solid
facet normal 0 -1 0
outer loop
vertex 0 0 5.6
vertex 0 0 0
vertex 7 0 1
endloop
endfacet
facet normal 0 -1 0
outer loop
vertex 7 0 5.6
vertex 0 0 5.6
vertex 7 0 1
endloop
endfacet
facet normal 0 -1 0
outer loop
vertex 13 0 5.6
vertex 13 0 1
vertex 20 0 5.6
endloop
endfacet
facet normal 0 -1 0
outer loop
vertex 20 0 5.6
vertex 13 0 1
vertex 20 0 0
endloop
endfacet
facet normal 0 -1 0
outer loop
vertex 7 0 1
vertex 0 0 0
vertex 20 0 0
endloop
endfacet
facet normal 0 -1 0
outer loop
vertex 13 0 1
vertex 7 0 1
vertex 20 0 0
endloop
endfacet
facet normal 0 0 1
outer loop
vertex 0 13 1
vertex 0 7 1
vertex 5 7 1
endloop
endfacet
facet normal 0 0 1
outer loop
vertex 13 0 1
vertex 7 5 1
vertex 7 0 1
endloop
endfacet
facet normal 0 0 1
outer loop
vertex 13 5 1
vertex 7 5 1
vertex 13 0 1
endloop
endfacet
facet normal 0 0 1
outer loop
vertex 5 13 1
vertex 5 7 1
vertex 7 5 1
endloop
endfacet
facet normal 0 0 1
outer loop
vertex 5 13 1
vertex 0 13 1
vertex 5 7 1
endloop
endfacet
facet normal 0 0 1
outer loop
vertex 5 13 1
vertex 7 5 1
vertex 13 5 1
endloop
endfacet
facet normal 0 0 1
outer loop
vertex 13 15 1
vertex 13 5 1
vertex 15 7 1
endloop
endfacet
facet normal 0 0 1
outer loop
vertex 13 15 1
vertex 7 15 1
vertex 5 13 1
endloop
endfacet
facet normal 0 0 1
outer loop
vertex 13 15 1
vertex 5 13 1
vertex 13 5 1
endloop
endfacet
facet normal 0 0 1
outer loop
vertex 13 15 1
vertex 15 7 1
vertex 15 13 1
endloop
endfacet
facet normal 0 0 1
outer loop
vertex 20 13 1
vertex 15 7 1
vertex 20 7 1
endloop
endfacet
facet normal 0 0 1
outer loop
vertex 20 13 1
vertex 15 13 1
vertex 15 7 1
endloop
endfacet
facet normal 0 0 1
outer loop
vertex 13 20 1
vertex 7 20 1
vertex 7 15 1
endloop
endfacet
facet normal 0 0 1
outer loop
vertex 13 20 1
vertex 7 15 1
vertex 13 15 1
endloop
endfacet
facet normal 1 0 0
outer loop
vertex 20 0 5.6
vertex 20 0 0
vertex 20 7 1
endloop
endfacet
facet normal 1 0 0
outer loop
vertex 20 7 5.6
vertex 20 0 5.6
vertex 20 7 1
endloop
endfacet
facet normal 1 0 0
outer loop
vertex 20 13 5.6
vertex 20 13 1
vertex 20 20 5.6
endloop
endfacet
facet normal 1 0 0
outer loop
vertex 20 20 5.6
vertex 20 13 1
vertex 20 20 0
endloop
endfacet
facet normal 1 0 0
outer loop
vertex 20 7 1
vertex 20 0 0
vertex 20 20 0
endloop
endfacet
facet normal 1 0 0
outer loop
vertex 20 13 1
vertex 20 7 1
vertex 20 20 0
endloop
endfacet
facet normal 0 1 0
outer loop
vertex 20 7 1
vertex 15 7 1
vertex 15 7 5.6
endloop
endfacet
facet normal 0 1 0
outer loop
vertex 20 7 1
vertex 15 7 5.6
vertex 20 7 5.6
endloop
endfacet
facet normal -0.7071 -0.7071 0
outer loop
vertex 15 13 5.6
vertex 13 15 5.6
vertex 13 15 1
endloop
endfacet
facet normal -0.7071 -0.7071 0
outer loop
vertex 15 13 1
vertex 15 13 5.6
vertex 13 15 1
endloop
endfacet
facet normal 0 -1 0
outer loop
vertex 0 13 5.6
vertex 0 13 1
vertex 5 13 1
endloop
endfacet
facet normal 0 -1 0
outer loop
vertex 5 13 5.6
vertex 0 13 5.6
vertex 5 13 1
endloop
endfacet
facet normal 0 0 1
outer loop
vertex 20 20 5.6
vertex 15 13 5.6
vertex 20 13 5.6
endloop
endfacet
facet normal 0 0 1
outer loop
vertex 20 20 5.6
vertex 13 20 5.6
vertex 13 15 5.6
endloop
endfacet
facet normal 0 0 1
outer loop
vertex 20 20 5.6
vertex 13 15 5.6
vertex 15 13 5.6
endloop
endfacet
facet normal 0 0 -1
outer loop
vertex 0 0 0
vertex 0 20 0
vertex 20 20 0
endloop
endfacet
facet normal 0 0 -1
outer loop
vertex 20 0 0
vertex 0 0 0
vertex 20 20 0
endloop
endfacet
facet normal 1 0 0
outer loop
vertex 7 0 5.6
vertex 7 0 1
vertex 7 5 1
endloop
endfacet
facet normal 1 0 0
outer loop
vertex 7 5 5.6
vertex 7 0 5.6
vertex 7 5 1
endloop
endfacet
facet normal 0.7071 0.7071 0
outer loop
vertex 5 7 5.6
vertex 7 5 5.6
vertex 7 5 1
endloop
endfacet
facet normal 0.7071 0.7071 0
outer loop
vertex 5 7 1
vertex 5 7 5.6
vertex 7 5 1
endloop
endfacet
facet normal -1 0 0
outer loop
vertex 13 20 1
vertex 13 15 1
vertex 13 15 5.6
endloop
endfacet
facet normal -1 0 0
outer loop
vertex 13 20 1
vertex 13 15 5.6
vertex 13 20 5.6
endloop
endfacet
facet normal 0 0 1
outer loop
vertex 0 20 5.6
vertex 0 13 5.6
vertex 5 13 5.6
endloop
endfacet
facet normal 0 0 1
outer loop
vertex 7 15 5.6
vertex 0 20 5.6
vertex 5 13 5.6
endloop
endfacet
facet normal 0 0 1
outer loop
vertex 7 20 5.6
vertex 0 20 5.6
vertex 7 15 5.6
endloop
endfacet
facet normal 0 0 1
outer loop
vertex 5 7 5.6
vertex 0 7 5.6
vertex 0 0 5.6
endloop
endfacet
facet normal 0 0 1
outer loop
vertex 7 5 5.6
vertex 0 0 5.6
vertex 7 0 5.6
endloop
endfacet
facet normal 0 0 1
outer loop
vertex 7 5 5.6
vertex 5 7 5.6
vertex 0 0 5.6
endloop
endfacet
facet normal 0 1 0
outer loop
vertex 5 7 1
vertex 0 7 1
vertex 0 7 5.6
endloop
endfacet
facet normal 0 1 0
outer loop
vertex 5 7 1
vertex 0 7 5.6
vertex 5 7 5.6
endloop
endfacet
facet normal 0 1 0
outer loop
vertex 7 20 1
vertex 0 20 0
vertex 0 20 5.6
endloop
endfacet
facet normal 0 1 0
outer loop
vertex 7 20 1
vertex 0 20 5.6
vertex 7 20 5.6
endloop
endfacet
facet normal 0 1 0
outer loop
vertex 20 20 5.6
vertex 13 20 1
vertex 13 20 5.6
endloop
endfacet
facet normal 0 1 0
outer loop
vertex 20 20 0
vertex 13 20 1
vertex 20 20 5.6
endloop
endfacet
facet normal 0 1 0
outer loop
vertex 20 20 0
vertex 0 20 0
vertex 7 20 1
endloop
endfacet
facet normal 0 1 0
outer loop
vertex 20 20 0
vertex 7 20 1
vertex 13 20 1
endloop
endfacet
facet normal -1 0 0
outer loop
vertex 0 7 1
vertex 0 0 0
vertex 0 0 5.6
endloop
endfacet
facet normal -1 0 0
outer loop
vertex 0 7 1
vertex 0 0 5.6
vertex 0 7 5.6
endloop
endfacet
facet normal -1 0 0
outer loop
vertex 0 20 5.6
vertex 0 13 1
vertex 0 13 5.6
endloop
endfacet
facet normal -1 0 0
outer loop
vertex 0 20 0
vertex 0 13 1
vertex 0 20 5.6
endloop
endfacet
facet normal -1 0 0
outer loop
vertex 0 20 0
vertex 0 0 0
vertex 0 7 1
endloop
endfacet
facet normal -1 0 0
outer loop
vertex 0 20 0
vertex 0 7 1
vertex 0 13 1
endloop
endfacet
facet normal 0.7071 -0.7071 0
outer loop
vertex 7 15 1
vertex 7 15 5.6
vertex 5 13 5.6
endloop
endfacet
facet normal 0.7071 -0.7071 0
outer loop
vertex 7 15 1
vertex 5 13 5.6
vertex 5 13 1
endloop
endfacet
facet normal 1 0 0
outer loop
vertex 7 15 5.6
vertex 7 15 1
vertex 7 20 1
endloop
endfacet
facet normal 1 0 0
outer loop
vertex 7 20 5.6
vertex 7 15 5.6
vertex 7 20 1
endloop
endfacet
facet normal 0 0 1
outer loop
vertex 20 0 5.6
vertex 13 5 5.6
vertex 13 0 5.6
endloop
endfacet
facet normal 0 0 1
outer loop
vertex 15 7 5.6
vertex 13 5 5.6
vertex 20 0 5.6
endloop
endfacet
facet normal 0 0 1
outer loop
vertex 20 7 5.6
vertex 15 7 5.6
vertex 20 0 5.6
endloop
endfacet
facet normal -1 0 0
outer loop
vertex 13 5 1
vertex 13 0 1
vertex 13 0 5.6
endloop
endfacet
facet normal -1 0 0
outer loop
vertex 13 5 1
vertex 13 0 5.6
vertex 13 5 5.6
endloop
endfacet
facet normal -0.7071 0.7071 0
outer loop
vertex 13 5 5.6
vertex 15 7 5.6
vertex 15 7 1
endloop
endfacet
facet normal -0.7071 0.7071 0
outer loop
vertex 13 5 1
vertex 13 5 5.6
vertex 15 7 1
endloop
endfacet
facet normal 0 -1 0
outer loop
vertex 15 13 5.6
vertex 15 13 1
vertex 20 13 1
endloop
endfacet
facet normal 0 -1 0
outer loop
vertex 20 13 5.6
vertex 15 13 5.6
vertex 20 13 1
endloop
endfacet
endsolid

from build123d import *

# Parameters (mm, degrees)
BOX002_W     = 20
BOX002_H     = 6
BOX002_DEPTH = 10
BOX001_W     = 6
BOX001_H     = 20
BOX001_DEPTH = 10
BOX_W        = 20
BOX_H        = 20
BOX_DEPTH    = 4.6
CHAMFER_SIZE = 2
BOX003_W     = 20
BOX003_H     = 20
BOX003_DEPTH = 1


with BuildPart() as cube002:
    # Box002 → Box002 (new body)
    with BuildSketch(Plane(origin=(0, 7, 0), x_dir=(1, 0, 0), z_dir=(0, 0, 1))):
        with Locations((10, 3)):
            Rectangle(BOX002_W, BOX002_H)
    extrude(amount=BOX002_DEPTH)


with BuildPart() as fusion:
    # Box001 → Box001 (new body)
    with BuildSketch(Plane(origin=(7, 0, 0), x_dir=(1, 0, 0), z_dir=(0, 0, 1))):
        with Locations((3, 10)):
            Rectangle(BOX001_W, BOX001_H)
    extrude(amount=BOX001_DEPTH)

    # Fusion: union Cube002
    add(cube002.part)


with BuildPart() as base_button:
    # Box → Box (new body)
    with BuildSketch(Plane.XY):
        with Locations((10, 10)):
            Rectangle(BOX_W, BOX_H)
    extrude(amount=BOX_DEPTH)

    # Cut: cut Fusion
    add(fusion.part, mode=Mode.SUBTRACT)

    # Chamfer
    chamfer_edges = [base_button.edges().sort_by_distance(p)[0] for p in [
        (7, 7, 2.3),
        (7, 13, 2.3),
        (13, 13, 2.3),
        (13, 7, 2.3),
    ]]
    chamfer(chamfer_edges, length=CHAMFER_SIZE)


with BuildPart() as base_button_1:
    # Chamfer placement: moved
    add(base_button.part.moved(Location((0, 0, 1))))


with BuildPart() as single_pad_base:
    # Box003 → Box003 (new body)
    with BuildSketch(Plane.XY):
        with Locations((10, 10)):
            Rectangle(BOX003_W, BOX003_H)
    extrude(amount=BOX003_DEPTH)

    # Fusion001: union base_button
    add(base_button_1.part)


solid = single_pad_base.part
